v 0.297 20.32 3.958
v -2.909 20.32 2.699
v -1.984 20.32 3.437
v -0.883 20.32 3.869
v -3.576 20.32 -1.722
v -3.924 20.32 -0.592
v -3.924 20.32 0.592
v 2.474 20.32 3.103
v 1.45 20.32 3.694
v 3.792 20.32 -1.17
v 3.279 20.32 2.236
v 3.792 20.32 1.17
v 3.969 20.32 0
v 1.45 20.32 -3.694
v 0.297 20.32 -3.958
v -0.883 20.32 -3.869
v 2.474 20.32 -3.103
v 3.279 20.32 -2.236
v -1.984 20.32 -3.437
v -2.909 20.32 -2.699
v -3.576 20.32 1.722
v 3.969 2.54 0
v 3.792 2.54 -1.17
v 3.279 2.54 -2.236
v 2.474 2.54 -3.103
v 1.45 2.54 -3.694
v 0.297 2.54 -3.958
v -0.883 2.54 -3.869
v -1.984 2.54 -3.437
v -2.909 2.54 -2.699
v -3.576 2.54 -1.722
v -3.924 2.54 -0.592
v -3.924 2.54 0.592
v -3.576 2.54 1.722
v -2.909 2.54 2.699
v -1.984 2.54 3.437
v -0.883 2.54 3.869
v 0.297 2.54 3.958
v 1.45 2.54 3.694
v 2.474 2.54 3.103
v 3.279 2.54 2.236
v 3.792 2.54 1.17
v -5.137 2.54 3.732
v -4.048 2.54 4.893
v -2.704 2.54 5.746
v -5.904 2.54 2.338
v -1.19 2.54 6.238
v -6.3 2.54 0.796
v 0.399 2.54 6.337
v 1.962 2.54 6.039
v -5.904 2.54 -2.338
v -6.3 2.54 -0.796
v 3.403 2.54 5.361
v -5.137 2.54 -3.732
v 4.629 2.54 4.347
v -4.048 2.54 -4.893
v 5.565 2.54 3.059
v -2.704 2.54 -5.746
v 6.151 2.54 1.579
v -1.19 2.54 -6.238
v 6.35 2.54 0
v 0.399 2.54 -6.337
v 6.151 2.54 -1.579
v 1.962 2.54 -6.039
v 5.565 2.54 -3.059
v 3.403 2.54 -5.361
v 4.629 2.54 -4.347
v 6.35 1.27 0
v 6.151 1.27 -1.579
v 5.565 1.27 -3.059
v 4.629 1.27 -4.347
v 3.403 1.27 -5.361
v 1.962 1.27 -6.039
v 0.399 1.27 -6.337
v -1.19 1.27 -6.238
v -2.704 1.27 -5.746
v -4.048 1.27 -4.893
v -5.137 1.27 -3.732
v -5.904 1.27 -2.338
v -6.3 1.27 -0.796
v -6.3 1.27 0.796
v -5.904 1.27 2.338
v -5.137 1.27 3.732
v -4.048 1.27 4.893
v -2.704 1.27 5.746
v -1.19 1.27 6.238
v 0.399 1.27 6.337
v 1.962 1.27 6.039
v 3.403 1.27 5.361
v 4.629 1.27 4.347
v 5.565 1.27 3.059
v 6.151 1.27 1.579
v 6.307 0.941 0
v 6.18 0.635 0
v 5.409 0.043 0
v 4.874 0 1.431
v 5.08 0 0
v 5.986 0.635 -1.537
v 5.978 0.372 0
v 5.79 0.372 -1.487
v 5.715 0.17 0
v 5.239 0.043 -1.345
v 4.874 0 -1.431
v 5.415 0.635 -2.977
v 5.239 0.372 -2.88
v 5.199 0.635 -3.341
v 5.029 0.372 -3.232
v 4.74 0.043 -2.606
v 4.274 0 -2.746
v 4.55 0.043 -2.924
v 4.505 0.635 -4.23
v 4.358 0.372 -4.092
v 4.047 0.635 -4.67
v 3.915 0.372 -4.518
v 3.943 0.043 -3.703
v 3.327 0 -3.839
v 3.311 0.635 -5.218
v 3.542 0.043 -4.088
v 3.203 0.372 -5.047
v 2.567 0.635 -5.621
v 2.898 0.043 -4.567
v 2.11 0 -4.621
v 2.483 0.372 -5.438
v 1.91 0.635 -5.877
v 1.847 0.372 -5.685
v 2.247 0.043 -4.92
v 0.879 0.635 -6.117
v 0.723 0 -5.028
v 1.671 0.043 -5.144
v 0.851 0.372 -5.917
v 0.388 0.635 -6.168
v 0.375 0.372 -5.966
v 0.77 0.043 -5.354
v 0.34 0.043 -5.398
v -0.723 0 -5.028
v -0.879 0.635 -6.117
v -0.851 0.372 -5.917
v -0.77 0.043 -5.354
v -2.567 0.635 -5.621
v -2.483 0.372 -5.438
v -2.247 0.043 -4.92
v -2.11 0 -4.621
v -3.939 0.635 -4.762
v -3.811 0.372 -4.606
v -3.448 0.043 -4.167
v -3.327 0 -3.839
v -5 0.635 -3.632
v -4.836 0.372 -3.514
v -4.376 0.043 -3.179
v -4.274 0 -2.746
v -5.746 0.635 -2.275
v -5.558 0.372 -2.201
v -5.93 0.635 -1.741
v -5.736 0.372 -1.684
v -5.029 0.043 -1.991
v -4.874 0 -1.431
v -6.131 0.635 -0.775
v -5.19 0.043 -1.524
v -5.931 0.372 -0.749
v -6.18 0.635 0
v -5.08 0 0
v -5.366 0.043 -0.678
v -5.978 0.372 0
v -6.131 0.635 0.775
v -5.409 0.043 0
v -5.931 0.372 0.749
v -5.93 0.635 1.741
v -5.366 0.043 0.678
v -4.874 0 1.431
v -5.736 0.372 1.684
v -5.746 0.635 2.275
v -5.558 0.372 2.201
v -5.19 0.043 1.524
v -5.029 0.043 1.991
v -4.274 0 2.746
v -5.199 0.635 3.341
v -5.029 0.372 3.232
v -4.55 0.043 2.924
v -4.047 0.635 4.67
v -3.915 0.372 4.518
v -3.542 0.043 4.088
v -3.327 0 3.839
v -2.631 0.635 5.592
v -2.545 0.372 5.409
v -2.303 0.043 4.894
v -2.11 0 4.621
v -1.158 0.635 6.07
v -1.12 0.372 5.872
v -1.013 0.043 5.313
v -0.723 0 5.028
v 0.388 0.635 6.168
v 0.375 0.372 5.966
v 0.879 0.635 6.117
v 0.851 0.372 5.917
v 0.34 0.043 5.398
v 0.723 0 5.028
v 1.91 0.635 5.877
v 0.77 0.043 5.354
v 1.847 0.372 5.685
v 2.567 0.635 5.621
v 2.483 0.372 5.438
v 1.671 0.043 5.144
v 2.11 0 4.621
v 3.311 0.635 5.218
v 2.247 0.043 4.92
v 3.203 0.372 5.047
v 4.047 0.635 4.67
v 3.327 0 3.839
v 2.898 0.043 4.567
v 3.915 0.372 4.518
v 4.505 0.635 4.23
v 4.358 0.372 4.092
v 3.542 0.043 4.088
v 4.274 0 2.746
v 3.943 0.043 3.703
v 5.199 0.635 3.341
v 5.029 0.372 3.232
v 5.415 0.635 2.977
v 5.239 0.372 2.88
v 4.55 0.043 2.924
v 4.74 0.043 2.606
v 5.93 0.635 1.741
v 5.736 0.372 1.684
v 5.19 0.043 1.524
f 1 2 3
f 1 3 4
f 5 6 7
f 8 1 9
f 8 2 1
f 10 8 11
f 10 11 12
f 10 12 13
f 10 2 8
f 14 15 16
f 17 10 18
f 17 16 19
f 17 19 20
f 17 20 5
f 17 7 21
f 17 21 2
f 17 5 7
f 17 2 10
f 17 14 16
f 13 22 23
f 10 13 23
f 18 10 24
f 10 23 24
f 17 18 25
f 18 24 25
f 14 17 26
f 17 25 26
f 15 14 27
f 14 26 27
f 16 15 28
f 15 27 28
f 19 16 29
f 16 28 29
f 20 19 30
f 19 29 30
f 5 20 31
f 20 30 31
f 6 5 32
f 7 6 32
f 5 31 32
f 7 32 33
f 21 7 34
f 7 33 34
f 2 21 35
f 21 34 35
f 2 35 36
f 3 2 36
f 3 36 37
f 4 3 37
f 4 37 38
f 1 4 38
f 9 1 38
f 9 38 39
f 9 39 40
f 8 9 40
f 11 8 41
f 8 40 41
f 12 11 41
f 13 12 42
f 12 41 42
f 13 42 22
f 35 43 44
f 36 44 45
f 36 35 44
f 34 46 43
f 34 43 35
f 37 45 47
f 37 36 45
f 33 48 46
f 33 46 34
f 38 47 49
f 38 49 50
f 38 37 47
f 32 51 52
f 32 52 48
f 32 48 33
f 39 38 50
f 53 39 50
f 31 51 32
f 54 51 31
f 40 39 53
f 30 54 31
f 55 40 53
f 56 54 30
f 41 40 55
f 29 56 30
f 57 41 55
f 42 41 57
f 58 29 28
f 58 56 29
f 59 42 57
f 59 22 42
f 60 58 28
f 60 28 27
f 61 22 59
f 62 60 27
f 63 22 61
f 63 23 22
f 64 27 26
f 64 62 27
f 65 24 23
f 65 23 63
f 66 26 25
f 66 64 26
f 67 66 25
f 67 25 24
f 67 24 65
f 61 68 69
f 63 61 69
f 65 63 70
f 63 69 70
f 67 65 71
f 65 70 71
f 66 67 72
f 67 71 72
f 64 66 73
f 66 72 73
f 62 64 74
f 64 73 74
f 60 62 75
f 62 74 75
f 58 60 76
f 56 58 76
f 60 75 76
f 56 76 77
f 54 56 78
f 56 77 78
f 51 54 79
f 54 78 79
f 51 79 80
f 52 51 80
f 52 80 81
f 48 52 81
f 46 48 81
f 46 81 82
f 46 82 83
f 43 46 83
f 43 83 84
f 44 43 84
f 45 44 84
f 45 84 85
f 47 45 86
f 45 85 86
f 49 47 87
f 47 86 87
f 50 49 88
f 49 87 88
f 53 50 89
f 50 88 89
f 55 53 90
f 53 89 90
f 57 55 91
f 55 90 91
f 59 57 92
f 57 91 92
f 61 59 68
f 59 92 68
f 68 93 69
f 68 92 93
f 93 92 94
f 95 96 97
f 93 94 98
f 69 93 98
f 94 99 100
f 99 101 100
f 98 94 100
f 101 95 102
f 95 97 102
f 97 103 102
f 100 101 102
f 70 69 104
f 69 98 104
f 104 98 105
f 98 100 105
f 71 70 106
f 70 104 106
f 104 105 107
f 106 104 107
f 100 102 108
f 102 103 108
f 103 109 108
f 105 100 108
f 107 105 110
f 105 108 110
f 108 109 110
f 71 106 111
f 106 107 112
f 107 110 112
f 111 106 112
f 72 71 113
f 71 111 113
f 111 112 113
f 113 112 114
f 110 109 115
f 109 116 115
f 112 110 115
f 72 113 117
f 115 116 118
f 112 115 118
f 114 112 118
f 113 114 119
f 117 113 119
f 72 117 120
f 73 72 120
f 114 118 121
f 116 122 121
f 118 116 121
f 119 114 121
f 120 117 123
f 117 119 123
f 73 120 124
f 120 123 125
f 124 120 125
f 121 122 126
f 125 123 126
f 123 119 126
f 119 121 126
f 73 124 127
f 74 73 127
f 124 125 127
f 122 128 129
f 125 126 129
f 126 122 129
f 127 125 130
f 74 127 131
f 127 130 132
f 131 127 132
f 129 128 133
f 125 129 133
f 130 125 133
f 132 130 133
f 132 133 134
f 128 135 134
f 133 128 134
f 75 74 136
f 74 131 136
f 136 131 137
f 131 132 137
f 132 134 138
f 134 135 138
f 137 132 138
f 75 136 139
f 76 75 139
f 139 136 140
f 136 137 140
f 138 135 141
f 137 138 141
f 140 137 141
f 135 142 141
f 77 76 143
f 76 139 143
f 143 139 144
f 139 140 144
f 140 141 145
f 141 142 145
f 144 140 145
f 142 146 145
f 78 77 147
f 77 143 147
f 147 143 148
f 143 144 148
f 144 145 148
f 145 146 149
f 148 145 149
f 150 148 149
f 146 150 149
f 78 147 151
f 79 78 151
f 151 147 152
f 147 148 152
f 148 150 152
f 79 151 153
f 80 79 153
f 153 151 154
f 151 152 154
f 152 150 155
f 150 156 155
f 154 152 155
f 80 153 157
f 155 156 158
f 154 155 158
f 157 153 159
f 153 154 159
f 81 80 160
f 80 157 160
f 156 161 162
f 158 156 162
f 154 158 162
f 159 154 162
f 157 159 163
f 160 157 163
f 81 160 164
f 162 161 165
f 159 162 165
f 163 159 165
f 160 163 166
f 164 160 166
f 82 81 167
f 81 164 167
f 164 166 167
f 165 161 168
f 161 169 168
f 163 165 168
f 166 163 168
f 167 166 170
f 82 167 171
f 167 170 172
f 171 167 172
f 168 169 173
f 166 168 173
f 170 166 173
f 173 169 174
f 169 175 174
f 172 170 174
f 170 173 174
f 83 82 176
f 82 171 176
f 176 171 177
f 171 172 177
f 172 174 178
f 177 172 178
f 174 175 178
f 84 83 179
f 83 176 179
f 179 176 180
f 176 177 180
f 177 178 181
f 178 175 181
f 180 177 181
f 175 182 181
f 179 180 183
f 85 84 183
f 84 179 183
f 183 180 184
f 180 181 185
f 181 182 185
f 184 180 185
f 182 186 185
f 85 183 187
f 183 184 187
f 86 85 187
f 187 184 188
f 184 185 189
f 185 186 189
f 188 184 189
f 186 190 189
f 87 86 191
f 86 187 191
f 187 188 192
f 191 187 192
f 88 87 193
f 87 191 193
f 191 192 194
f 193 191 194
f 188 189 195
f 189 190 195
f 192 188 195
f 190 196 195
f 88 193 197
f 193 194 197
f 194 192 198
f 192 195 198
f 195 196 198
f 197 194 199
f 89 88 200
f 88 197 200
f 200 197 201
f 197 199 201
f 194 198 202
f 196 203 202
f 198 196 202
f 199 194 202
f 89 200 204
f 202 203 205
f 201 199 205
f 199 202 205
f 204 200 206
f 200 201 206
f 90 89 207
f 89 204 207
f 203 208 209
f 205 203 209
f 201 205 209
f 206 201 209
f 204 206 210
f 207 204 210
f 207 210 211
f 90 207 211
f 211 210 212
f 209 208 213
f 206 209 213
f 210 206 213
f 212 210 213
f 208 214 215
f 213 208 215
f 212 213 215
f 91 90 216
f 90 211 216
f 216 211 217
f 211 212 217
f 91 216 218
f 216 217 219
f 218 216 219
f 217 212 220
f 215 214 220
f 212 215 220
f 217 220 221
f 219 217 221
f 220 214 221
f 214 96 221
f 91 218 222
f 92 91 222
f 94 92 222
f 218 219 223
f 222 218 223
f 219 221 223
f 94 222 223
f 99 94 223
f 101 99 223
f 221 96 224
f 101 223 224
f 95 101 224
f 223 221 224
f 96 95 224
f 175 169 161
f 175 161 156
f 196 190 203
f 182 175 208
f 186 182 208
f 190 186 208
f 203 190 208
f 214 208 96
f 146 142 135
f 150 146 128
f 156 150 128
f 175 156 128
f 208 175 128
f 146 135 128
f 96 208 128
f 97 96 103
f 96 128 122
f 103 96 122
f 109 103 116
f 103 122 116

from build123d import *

# Parameters (mm, degrees)
SKETCH1_R           = 6.35
BOSS_EXTRUDE1_DEPTH = 2.54
FILLET2_R           = 1.27
SKETCH2_R           = 3.96875
BOSS_EXTRUDE3_DEPTH = 17.78


with BuildPart() as part:
    # Sketch1 → Boss-Extrude1 (new body)
    with BuildSketch(Plane(origin=(0, 0, 0), x_dir=(1, 0, 0), z_dir=(0, 1, 0))):
        Circle(SKETCH1_R)
    extrude(amount=BOSS_EXTRUDE1_DEPTH)

    # Fillet2
    fillet2_edges = [part.edges().sort_by_distance(p)[0] for p in [
        (-6.35, 0, 0),
    ]]
    fillet(fillet2_edges, radius=FILLET2_R)

    # Sketch2 → Boss-Extrude3 (add)
    with BuildSketch(Plane(origin=(0, 2.54, 0), x_dir=(1, 0, 0), z_dir=(0, 1, 0))):
        Circle(SKETCH2_R)
    extrude(amount=BOSS_EXTRUDE3_DEPTH)


solid = part.part
